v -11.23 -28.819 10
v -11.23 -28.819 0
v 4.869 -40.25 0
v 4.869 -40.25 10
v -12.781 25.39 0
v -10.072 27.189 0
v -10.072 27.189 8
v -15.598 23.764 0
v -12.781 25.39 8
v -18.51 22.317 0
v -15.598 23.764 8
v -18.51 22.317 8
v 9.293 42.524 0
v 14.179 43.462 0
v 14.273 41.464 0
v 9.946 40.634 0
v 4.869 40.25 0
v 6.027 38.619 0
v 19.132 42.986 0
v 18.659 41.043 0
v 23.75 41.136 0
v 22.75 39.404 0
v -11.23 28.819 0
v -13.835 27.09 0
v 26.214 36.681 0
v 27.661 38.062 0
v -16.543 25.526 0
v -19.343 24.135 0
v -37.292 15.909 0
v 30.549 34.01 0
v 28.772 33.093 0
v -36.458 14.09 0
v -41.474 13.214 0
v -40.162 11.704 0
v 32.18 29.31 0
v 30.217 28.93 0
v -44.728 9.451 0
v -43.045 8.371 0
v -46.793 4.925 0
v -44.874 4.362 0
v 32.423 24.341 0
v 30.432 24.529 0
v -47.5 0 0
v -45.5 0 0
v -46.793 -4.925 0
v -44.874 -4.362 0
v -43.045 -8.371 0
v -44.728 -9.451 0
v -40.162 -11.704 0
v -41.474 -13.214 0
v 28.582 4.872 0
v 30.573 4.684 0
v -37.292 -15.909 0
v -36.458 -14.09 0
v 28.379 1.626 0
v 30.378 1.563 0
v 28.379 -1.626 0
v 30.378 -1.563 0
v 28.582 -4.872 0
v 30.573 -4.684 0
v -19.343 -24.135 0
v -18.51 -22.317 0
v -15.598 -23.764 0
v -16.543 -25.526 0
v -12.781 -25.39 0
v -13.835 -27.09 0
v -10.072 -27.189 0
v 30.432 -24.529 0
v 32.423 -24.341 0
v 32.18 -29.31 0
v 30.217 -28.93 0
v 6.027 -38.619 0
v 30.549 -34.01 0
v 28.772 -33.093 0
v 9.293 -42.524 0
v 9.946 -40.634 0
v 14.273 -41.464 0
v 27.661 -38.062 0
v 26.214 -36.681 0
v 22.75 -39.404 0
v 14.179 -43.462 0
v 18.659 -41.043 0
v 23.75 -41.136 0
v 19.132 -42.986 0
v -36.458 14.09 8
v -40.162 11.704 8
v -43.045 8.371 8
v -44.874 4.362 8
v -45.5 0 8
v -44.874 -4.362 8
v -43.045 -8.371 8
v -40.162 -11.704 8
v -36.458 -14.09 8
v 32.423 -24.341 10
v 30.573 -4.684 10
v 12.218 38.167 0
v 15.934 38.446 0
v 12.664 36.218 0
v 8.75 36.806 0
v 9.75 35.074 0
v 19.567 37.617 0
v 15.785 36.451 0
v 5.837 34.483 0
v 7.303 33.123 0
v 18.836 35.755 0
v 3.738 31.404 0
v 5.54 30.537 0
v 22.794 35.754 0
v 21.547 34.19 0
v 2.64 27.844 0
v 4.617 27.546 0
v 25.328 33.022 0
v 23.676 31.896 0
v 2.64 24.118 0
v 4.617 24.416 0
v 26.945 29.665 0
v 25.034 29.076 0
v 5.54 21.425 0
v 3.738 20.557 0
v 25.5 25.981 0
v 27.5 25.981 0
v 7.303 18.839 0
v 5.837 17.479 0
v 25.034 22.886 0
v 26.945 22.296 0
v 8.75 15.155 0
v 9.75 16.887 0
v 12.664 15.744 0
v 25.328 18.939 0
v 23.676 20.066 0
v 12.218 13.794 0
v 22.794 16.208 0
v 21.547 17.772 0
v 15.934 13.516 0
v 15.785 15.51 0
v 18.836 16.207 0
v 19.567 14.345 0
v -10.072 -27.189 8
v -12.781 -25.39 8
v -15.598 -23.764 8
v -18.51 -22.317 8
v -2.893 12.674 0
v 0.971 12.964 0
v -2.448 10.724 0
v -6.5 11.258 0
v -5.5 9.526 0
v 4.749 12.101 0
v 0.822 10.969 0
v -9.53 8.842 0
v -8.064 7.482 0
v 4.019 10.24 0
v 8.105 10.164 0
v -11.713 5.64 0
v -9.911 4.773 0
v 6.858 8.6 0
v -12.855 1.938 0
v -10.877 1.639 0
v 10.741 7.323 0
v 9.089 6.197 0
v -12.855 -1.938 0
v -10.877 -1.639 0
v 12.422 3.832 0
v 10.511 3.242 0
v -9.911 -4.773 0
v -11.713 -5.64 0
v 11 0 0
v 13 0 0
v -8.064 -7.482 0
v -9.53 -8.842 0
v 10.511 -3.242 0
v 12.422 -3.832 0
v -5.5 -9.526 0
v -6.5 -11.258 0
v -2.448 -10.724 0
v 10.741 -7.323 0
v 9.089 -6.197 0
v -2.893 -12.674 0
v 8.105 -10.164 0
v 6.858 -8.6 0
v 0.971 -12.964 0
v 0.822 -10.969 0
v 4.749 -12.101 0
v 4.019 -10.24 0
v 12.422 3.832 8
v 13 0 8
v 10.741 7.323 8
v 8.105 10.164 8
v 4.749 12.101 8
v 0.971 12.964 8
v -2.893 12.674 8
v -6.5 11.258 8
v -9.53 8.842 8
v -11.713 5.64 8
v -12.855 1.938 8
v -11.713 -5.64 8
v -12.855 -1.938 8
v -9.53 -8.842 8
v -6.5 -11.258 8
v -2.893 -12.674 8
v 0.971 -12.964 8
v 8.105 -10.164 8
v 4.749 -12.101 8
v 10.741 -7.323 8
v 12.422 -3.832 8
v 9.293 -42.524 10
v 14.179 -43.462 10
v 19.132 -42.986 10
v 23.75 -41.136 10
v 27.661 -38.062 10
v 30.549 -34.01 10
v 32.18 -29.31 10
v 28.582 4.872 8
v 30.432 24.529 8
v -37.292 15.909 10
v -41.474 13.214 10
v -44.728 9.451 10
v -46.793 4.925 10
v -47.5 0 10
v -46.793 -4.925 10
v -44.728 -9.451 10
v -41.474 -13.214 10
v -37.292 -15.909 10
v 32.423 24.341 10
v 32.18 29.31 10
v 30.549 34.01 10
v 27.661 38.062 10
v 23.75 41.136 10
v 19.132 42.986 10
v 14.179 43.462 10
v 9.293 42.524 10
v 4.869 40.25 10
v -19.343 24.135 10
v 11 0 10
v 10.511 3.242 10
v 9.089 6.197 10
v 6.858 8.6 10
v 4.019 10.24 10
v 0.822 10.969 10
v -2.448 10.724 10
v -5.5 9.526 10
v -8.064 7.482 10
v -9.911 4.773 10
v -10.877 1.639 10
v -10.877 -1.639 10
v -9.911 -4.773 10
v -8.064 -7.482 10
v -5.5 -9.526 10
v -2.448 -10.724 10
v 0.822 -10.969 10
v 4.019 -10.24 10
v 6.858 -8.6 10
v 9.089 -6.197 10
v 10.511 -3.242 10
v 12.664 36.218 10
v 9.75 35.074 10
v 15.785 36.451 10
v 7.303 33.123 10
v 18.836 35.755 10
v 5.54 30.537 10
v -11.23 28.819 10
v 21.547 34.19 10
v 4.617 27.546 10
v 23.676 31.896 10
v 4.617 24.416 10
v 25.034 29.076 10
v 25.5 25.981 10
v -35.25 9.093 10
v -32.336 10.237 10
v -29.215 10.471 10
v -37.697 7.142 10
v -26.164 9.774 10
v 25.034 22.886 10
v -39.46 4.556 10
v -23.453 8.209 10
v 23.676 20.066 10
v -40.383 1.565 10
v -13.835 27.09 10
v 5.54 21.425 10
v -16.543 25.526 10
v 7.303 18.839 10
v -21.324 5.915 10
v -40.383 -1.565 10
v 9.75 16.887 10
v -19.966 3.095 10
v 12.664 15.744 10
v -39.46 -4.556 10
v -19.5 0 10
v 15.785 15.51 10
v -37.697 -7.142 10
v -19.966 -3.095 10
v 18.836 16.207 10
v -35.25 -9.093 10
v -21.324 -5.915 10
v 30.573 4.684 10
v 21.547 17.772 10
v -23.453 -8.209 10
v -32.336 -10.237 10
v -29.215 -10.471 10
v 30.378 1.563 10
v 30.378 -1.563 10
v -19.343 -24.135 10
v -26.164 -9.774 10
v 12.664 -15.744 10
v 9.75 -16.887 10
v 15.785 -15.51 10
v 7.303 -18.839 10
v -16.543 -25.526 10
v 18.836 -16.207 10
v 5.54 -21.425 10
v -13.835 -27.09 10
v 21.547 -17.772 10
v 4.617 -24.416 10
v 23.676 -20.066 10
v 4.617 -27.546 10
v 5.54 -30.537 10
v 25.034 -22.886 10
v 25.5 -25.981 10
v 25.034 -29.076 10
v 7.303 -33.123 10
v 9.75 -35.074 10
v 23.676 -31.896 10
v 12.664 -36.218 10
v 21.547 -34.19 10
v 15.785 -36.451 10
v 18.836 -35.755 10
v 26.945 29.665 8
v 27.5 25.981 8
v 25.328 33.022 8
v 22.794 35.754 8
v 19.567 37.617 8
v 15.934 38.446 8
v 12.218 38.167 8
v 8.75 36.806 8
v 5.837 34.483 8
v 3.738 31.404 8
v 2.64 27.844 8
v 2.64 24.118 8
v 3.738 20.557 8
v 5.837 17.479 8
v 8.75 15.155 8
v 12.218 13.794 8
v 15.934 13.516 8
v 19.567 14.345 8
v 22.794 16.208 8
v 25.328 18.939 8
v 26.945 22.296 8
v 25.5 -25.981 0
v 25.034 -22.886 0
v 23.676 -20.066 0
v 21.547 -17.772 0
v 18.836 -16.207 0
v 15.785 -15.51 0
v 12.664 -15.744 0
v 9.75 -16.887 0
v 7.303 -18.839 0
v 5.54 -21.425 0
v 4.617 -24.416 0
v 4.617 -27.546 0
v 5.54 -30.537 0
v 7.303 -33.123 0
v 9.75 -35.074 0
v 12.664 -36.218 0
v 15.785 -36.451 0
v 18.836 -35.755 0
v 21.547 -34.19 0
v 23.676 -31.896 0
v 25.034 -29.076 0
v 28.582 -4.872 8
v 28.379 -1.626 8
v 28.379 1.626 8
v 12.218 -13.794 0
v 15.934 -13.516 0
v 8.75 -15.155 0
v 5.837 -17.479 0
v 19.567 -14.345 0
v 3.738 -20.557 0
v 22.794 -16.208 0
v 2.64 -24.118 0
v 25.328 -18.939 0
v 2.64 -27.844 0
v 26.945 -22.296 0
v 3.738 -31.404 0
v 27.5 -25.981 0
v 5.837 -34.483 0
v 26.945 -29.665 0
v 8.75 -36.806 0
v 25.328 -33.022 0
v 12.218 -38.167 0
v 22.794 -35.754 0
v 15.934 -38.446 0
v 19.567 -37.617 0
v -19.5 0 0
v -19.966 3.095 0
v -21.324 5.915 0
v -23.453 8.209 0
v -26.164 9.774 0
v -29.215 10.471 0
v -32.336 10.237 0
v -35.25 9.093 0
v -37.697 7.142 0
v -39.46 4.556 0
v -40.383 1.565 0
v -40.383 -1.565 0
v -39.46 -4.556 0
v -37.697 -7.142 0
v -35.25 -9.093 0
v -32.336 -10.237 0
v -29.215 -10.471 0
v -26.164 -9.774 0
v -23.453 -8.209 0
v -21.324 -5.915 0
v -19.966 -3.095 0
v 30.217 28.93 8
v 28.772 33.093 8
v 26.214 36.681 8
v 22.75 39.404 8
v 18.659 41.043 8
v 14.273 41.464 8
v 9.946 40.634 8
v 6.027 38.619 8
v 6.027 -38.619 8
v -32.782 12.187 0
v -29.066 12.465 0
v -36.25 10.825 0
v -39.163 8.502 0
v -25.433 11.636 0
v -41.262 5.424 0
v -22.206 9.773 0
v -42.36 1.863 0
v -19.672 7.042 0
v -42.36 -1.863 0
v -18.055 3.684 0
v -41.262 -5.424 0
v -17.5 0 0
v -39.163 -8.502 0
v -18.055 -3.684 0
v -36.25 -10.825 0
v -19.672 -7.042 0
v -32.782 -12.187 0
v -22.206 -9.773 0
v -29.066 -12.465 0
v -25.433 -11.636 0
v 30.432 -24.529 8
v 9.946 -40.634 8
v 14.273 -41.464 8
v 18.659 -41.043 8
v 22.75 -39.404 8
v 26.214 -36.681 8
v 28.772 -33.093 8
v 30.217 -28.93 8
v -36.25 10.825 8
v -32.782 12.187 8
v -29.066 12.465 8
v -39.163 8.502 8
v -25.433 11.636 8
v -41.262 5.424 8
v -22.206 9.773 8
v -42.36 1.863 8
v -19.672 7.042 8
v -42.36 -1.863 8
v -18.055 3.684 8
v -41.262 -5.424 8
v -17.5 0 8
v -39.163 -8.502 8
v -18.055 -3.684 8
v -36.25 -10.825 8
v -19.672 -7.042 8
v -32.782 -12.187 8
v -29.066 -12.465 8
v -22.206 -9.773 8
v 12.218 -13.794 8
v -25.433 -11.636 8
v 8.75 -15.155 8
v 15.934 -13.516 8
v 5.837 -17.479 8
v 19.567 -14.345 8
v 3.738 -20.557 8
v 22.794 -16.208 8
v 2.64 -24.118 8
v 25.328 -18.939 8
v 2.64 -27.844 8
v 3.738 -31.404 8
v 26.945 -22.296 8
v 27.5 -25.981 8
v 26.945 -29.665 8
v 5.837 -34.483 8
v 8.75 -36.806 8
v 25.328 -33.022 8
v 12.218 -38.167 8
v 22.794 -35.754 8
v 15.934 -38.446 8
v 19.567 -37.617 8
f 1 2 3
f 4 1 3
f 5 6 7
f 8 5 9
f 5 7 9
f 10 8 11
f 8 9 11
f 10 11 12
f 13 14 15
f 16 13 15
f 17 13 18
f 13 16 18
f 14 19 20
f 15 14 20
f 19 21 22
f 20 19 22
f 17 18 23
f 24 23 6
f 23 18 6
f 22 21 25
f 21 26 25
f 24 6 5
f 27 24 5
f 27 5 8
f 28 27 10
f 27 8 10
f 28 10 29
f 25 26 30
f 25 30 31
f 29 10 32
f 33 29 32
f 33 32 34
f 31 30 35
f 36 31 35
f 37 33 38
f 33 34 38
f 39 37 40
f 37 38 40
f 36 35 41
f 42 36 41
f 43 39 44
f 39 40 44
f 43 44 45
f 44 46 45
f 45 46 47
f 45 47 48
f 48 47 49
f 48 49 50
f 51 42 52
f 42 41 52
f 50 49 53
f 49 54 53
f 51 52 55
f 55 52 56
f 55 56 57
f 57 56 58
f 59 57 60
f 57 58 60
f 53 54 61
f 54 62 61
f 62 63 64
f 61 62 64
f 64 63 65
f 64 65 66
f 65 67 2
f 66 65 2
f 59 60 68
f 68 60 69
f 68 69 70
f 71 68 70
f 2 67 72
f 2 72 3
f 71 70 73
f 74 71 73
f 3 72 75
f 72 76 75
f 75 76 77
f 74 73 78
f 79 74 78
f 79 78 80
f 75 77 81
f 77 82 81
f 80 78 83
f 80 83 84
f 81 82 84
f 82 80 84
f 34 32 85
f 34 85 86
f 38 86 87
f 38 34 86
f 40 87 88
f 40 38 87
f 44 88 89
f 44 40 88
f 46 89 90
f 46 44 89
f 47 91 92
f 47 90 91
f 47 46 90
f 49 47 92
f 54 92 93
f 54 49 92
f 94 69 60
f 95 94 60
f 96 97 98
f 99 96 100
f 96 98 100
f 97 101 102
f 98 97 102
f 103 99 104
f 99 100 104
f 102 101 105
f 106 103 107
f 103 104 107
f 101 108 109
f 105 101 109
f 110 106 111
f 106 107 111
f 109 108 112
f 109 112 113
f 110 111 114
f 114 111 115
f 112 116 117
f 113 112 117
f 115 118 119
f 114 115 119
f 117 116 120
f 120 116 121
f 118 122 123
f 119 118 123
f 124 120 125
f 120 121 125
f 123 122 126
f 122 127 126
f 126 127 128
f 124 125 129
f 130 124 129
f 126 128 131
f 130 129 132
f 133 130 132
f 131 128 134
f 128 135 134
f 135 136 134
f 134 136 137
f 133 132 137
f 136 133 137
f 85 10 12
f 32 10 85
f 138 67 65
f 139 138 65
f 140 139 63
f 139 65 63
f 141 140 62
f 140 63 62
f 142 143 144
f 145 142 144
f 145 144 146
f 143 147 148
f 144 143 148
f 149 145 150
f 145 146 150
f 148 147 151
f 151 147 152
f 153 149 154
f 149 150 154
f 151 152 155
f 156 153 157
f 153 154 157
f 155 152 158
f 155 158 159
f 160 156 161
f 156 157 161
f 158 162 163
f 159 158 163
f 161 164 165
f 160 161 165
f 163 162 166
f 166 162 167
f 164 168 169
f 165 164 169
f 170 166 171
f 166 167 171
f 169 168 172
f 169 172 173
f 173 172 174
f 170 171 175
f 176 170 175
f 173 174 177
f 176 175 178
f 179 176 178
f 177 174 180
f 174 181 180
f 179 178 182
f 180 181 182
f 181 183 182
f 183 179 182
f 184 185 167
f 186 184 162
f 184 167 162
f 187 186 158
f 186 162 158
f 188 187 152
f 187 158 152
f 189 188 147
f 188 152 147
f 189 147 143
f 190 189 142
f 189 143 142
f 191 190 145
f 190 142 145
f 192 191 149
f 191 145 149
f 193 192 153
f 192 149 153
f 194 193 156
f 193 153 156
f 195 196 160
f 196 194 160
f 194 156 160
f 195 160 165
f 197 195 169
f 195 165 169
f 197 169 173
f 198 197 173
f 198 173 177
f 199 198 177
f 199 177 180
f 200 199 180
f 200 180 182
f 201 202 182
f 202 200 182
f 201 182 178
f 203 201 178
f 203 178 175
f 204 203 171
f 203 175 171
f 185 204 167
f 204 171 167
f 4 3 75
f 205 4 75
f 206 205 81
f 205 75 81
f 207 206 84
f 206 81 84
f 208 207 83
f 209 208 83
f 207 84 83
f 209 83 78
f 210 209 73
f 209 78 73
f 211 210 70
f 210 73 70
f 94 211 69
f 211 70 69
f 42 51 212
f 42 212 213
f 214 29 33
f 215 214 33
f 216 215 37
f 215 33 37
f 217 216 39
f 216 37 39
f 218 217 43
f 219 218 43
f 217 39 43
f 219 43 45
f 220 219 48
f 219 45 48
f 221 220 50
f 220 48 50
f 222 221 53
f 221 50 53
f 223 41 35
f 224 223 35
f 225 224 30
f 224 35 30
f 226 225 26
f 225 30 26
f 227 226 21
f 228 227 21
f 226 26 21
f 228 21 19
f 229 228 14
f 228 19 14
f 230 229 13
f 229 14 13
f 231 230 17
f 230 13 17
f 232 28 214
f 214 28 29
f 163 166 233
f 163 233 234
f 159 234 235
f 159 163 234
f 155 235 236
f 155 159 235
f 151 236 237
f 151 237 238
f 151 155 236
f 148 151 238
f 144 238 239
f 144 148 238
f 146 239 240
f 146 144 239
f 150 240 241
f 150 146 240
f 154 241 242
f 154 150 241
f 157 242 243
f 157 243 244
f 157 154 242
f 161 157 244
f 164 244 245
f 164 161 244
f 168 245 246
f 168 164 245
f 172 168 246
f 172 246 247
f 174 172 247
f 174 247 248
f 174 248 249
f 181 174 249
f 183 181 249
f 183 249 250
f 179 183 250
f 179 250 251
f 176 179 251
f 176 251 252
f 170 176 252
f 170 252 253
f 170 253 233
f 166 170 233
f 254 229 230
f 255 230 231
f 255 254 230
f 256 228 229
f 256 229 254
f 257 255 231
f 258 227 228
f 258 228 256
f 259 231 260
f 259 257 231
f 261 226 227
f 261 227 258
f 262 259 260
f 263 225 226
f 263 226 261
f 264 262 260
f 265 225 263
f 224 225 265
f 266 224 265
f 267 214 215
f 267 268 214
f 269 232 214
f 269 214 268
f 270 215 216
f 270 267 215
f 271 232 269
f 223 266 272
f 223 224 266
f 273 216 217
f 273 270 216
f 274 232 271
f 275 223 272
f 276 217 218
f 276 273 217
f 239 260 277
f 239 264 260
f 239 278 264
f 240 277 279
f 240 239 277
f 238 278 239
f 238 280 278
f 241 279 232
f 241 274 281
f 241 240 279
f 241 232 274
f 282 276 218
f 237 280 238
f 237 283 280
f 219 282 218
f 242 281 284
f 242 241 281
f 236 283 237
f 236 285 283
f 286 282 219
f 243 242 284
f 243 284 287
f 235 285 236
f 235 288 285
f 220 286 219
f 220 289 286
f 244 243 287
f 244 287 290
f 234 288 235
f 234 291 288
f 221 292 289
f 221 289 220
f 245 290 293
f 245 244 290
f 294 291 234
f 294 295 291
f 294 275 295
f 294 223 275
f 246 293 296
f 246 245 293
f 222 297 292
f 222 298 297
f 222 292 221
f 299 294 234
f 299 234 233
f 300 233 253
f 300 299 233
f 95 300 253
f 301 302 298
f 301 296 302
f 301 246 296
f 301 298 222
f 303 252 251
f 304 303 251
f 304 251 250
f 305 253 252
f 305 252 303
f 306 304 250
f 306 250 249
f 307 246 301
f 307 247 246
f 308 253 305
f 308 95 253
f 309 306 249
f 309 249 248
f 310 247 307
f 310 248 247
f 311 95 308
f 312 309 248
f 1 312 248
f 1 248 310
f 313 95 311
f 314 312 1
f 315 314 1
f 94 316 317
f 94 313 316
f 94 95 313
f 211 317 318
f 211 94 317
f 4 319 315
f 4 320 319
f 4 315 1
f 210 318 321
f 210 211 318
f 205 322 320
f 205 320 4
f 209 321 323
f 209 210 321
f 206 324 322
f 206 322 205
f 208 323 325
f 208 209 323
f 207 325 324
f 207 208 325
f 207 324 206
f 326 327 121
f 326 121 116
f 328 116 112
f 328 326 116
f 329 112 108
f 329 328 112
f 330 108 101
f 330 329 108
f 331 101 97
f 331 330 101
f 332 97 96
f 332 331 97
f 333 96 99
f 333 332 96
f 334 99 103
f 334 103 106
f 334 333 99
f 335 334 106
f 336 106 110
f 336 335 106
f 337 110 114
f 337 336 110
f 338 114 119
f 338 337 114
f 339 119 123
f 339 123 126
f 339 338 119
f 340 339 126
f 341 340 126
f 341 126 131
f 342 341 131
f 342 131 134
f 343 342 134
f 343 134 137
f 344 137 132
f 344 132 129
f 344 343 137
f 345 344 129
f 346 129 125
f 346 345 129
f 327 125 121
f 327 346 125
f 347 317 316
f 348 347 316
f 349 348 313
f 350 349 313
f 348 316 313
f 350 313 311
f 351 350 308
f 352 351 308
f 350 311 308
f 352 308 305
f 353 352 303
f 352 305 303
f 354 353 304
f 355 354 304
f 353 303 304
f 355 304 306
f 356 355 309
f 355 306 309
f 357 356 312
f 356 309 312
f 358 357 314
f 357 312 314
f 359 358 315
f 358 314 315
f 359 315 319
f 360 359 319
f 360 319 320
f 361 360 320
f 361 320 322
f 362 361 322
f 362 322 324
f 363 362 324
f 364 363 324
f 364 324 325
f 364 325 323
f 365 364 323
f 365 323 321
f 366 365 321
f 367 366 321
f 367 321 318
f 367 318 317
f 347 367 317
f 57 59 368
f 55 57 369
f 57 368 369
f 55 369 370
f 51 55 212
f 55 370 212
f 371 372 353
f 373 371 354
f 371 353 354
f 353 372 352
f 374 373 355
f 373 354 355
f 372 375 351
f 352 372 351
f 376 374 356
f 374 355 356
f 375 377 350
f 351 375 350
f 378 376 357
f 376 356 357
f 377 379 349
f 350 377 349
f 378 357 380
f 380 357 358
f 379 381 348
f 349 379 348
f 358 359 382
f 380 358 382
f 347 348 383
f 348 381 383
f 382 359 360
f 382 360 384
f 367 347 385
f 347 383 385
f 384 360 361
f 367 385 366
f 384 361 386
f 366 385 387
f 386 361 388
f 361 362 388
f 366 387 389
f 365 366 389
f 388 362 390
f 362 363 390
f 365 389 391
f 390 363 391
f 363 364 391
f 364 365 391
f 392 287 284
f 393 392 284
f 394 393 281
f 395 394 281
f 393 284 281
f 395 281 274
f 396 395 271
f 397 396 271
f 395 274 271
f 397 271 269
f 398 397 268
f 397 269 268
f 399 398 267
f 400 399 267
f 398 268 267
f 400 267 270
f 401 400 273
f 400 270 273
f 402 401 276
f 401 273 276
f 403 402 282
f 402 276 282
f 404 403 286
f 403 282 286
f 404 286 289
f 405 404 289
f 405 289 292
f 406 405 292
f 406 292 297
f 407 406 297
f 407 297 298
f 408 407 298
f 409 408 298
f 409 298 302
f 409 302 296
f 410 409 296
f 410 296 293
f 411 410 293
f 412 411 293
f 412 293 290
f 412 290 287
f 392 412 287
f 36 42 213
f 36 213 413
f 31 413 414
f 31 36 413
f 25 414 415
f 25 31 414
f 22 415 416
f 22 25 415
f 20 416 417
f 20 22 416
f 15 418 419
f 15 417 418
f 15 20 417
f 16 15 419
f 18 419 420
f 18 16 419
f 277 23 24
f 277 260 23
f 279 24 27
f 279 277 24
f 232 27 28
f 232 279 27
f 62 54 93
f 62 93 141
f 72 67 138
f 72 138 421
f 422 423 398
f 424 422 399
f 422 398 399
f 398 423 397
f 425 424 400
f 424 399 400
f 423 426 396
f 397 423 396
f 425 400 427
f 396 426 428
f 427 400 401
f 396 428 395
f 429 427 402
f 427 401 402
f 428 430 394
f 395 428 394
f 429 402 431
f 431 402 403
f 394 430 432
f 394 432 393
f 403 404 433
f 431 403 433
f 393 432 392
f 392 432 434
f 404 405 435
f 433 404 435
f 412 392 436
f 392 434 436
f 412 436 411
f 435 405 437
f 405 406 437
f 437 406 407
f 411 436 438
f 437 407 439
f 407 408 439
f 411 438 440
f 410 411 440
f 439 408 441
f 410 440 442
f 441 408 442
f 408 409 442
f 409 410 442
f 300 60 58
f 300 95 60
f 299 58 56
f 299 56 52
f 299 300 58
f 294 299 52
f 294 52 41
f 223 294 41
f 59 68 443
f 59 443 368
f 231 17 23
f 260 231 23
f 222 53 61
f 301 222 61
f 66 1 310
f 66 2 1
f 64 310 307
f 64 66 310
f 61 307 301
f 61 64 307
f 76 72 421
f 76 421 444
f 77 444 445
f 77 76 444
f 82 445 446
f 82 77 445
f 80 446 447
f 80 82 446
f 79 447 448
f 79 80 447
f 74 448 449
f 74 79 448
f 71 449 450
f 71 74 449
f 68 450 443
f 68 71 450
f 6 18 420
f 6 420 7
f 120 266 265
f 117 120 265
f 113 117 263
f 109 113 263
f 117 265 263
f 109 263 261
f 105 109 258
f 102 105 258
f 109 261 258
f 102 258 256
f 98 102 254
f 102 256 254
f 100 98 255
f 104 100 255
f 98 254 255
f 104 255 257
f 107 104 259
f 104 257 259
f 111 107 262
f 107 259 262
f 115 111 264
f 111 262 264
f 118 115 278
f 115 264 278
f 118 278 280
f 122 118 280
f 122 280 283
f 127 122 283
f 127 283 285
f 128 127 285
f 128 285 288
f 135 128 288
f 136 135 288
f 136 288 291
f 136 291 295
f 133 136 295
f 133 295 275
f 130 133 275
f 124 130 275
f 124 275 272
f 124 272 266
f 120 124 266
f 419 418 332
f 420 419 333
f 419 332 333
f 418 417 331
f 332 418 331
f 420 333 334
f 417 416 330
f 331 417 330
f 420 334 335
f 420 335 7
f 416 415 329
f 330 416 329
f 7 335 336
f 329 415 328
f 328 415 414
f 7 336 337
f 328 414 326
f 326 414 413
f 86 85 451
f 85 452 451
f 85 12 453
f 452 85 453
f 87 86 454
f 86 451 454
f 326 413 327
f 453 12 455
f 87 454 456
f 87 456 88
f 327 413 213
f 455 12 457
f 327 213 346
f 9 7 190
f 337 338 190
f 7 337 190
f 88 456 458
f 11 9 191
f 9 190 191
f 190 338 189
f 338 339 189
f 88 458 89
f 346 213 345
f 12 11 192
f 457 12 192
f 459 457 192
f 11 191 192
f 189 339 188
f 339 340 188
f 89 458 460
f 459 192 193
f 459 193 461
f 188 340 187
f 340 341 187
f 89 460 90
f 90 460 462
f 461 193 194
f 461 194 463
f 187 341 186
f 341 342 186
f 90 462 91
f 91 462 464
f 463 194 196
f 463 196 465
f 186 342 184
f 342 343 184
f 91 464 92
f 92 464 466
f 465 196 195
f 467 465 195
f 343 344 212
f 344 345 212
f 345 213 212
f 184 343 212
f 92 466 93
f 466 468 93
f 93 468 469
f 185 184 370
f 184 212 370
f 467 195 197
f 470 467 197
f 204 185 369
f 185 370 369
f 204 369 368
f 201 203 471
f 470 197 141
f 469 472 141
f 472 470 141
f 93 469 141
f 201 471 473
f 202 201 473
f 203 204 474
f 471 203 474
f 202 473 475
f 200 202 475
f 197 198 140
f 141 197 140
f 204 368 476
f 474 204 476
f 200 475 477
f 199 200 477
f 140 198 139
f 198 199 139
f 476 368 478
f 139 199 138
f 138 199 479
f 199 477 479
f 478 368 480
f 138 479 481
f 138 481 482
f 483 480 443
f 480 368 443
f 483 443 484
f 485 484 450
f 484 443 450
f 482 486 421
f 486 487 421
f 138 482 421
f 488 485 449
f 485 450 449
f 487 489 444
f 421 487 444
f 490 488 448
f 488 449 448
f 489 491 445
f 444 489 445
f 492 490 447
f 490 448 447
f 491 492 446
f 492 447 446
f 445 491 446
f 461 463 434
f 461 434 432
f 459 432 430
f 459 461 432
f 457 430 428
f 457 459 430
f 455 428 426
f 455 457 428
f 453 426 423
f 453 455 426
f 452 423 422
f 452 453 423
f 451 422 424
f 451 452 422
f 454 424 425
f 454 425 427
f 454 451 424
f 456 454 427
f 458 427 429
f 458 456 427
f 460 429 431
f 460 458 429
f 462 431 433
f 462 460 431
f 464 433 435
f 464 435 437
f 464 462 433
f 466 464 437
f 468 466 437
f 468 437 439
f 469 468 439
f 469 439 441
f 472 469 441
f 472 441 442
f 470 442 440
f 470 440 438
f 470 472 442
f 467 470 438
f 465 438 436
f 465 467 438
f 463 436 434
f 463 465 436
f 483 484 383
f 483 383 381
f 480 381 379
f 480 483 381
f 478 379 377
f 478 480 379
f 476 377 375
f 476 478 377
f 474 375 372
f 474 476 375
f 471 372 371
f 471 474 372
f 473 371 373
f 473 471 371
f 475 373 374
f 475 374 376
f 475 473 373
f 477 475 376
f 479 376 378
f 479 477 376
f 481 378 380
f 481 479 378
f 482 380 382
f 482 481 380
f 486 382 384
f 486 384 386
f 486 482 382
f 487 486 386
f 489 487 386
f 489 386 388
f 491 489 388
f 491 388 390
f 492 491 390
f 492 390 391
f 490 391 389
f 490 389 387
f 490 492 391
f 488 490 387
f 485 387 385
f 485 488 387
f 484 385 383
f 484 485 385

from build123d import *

# Parameters (mm, degrees)
F0_R     = 11
F1_DEPTH = 10
F2_COUNT = 3
F4_R     = 10.5
F5_DEPTH = 25
F6_R     = 50
F7_T     = -2


with BuildPart() as f1:
    # F0 (on Top) → F1 (new body)
    with BuildSketch(Plane.XY):
        with BuildLine():
            Line((-12.5, 27.2717802866), (-37.2916666667, 15.9085385005))
            ThreePointArc((-37.2916666667, 15.9085385005), (-47.5, 0), (-37.2916666667, -15.9085385005))
            Line((-37.2916666667, -15.9085385005), (-12.5, -27.2717802866))
            ThreePointArc((-12.5, -27.2717802866), (30, 0), (-12.5, 27.2717802866))
        make_face()
        Circle(F0_R, mode=Mode.SUBTRACT)
    extrude(amount=F1_DEPTH)


with BuildPart() as f2_1:
    # F2: instance of F1
    add(f1.part.rotate(Axis((0, 0, 0), (0, 0, -1)), 1 * 360 / F2_COUNT))


with BuildPart() as f2_2:
    # F2: instance of F1
    add(f1.part.rotate(Axis((0, 0, 0), (0, 0, -1)), 2 * 360 / F2_COUNT))


with BuildPart() as f1_1:
    add(f1.part)

    # F3: union F2_1, F2_2
    add(f2_1.part)
    add(f2_2.part)

    # F4 (on face) → F5 (cut)
    with BuildSketch(Plane.XY.offset(10)):
        with Locations((15, 25.9807621135)):
            Circle(F4_R)
        with Locations((15, -25.9807621135)):
            Circle(F4_R)
        with Locations((-30, 0)):
            Circle(F4_R)
    extrude(amount=-F5_DEPTH, mode=Mode.SUBTRACT)

    # F6
    f6_edges = [f1_1.edges().sort_by_distance(p)[0] for p in [
        (-15.066264, -26.095535, 5),
        (-15.066264, 26.095535, 5),
        (30.132528, 0, 5),
    ]]
    fillet(f6_edges, radius=F6_R)

    # F7
    f7_openings = [f1_1.faces().sort_by_distance(p)[0] for p in [
        (-27.825176, 18.947668, 0),
    ]]
    offset(amount=F7_T, openings=f7_openings)


solid = f1_1.part
